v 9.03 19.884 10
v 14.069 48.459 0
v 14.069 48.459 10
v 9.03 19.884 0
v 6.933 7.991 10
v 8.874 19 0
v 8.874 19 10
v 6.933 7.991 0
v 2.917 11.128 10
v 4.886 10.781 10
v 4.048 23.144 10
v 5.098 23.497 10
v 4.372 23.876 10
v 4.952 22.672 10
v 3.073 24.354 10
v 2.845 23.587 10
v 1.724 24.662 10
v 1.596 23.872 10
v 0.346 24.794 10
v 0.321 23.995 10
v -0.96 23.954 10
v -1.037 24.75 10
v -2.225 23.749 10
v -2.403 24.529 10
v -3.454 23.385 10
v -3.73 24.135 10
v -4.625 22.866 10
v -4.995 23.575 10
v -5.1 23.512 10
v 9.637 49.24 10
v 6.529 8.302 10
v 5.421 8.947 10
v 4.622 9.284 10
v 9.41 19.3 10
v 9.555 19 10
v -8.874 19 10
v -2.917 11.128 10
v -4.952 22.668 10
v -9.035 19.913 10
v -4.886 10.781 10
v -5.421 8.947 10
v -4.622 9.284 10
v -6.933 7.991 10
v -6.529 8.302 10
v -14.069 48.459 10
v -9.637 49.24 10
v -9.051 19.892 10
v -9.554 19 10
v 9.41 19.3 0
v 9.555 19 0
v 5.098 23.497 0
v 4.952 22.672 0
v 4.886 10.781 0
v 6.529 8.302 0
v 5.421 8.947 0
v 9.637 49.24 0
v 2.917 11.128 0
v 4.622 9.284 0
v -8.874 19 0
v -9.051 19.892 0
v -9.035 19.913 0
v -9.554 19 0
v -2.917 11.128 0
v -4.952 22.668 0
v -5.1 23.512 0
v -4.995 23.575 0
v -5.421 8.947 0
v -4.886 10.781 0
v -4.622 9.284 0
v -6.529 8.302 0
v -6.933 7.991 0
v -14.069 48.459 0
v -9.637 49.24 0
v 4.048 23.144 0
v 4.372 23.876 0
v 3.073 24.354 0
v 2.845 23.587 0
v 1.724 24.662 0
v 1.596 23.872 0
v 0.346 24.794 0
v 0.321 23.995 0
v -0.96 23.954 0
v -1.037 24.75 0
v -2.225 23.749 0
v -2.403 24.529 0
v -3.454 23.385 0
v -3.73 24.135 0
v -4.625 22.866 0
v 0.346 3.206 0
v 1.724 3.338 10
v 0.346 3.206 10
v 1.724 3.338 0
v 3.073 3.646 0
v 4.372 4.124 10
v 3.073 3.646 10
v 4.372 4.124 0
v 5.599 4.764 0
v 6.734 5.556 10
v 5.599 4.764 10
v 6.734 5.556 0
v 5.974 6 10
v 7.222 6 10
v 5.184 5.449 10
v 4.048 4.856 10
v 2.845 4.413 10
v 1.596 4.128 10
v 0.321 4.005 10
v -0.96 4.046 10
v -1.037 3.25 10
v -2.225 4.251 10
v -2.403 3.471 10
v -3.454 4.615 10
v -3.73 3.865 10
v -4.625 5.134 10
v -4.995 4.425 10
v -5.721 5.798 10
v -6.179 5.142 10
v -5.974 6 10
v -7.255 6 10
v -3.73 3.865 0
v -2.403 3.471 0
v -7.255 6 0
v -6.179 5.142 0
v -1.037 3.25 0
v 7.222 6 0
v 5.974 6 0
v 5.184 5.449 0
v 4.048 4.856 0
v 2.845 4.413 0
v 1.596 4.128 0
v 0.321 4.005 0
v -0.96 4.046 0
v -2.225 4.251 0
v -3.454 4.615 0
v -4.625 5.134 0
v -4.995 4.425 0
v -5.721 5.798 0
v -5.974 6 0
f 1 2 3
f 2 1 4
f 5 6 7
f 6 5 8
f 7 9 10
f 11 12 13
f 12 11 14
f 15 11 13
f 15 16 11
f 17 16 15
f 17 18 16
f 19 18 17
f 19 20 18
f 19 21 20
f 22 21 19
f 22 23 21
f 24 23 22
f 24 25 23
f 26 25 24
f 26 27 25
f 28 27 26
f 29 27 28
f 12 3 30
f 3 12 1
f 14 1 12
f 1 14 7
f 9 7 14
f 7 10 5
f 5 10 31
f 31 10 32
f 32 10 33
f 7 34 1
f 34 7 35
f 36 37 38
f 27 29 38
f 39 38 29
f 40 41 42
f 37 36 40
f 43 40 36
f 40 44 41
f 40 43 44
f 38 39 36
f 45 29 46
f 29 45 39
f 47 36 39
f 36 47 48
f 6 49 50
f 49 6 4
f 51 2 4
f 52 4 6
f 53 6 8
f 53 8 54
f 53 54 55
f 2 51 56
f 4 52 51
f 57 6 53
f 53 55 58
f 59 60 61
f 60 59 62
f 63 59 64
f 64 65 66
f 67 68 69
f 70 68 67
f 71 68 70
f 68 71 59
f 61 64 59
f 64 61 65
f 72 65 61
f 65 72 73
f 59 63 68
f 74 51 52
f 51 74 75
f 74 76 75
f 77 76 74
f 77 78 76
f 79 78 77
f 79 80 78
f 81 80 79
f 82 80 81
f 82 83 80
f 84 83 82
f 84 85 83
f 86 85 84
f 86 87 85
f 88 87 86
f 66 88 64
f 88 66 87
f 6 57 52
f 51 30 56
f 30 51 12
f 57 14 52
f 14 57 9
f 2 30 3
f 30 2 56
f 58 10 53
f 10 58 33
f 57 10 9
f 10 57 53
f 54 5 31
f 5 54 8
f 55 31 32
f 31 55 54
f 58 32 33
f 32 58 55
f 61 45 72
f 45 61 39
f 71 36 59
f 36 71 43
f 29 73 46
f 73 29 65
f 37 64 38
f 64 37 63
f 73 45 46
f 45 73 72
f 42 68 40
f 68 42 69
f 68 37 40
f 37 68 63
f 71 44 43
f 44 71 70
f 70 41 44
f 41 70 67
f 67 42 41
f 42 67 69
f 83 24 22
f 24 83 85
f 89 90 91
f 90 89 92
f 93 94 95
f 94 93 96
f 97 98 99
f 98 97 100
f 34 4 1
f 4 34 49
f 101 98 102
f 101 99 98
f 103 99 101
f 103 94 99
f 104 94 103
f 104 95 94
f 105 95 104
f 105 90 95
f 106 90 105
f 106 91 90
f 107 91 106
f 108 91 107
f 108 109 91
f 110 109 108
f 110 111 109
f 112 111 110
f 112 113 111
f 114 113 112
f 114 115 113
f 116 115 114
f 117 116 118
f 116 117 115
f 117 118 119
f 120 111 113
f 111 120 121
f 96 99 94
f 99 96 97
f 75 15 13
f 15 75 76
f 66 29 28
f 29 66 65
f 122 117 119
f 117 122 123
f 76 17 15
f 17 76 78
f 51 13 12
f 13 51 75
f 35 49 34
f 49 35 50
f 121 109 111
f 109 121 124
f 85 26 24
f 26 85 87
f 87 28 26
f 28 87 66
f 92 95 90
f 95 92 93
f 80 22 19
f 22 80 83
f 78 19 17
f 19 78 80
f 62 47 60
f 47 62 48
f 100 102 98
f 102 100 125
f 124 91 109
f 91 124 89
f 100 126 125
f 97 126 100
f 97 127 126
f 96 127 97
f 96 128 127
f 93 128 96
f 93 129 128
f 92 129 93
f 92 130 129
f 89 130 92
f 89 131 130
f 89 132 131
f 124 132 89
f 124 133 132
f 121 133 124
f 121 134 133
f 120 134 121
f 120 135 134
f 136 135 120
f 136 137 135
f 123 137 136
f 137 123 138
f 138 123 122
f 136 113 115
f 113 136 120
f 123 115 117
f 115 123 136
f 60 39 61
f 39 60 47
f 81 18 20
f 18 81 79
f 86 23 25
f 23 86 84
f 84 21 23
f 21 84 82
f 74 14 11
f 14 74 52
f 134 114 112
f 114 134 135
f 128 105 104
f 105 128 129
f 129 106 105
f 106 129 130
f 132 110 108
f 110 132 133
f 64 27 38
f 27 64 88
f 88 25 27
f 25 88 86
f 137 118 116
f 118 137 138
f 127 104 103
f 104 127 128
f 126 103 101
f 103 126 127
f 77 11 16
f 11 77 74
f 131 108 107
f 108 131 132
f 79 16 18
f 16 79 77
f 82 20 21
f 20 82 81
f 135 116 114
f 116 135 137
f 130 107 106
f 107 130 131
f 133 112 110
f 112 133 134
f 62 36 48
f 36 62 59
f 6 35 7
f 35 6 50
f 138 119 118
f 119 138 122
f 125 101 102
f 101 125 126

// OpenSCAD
w=0.4*8;
ww=w;
width=9;
h=10;
x=2.1/2.2;

translate([x,0,0])
branch();
mirror()
translate([x,0,0])
branch();

translate([0,14,0])
//rotate([0,0,])
spring();

module spring(w=0.4*2)
{
    d=20;
    difference()
    {
        cylinder(d=d+2*w,h=h,$fn=49);
        cylinder(d=d,h=h,$fn=49);
        translate([-(d+2*w)/2-1/2,-8,0])
        #cube([d+4*w,d/2+3,10]);
    }
}

module branch()
{
    rotate([0,0,-10])
    difference()
    {
        cube([4.5,50,10]);
        translate([0,2,0])
        #cube([2,9.3,10]);
        cylinder(d=20,h=h,$fn=49);
    }
}
//
//cube([w,width*6+ww,h]);
//translate([w+width,0,0])
//cube([w,width*6+ww,h]);
//
//translate([w/3,0,0])
//cube([w,w,h]);
//translate([w/3*2+width,0,0])
//cube([w,w,h]);
//
//
//difference()
//{
//    translate([0,w,0])
//    spring(w=w);
//    translate([w,w,0])
//    #spring();
//}
//
//module spring(w=0)
//{
//    //hull()
//    {
//        cube([2*w+width,width+w+0.4,h]);
//        translate([width/2+w,width+ww,0])
//        scale([1,1.5,1])
//        cylinder(d=width+1.5*w,h=h,$fn=49);
//    }
//}
